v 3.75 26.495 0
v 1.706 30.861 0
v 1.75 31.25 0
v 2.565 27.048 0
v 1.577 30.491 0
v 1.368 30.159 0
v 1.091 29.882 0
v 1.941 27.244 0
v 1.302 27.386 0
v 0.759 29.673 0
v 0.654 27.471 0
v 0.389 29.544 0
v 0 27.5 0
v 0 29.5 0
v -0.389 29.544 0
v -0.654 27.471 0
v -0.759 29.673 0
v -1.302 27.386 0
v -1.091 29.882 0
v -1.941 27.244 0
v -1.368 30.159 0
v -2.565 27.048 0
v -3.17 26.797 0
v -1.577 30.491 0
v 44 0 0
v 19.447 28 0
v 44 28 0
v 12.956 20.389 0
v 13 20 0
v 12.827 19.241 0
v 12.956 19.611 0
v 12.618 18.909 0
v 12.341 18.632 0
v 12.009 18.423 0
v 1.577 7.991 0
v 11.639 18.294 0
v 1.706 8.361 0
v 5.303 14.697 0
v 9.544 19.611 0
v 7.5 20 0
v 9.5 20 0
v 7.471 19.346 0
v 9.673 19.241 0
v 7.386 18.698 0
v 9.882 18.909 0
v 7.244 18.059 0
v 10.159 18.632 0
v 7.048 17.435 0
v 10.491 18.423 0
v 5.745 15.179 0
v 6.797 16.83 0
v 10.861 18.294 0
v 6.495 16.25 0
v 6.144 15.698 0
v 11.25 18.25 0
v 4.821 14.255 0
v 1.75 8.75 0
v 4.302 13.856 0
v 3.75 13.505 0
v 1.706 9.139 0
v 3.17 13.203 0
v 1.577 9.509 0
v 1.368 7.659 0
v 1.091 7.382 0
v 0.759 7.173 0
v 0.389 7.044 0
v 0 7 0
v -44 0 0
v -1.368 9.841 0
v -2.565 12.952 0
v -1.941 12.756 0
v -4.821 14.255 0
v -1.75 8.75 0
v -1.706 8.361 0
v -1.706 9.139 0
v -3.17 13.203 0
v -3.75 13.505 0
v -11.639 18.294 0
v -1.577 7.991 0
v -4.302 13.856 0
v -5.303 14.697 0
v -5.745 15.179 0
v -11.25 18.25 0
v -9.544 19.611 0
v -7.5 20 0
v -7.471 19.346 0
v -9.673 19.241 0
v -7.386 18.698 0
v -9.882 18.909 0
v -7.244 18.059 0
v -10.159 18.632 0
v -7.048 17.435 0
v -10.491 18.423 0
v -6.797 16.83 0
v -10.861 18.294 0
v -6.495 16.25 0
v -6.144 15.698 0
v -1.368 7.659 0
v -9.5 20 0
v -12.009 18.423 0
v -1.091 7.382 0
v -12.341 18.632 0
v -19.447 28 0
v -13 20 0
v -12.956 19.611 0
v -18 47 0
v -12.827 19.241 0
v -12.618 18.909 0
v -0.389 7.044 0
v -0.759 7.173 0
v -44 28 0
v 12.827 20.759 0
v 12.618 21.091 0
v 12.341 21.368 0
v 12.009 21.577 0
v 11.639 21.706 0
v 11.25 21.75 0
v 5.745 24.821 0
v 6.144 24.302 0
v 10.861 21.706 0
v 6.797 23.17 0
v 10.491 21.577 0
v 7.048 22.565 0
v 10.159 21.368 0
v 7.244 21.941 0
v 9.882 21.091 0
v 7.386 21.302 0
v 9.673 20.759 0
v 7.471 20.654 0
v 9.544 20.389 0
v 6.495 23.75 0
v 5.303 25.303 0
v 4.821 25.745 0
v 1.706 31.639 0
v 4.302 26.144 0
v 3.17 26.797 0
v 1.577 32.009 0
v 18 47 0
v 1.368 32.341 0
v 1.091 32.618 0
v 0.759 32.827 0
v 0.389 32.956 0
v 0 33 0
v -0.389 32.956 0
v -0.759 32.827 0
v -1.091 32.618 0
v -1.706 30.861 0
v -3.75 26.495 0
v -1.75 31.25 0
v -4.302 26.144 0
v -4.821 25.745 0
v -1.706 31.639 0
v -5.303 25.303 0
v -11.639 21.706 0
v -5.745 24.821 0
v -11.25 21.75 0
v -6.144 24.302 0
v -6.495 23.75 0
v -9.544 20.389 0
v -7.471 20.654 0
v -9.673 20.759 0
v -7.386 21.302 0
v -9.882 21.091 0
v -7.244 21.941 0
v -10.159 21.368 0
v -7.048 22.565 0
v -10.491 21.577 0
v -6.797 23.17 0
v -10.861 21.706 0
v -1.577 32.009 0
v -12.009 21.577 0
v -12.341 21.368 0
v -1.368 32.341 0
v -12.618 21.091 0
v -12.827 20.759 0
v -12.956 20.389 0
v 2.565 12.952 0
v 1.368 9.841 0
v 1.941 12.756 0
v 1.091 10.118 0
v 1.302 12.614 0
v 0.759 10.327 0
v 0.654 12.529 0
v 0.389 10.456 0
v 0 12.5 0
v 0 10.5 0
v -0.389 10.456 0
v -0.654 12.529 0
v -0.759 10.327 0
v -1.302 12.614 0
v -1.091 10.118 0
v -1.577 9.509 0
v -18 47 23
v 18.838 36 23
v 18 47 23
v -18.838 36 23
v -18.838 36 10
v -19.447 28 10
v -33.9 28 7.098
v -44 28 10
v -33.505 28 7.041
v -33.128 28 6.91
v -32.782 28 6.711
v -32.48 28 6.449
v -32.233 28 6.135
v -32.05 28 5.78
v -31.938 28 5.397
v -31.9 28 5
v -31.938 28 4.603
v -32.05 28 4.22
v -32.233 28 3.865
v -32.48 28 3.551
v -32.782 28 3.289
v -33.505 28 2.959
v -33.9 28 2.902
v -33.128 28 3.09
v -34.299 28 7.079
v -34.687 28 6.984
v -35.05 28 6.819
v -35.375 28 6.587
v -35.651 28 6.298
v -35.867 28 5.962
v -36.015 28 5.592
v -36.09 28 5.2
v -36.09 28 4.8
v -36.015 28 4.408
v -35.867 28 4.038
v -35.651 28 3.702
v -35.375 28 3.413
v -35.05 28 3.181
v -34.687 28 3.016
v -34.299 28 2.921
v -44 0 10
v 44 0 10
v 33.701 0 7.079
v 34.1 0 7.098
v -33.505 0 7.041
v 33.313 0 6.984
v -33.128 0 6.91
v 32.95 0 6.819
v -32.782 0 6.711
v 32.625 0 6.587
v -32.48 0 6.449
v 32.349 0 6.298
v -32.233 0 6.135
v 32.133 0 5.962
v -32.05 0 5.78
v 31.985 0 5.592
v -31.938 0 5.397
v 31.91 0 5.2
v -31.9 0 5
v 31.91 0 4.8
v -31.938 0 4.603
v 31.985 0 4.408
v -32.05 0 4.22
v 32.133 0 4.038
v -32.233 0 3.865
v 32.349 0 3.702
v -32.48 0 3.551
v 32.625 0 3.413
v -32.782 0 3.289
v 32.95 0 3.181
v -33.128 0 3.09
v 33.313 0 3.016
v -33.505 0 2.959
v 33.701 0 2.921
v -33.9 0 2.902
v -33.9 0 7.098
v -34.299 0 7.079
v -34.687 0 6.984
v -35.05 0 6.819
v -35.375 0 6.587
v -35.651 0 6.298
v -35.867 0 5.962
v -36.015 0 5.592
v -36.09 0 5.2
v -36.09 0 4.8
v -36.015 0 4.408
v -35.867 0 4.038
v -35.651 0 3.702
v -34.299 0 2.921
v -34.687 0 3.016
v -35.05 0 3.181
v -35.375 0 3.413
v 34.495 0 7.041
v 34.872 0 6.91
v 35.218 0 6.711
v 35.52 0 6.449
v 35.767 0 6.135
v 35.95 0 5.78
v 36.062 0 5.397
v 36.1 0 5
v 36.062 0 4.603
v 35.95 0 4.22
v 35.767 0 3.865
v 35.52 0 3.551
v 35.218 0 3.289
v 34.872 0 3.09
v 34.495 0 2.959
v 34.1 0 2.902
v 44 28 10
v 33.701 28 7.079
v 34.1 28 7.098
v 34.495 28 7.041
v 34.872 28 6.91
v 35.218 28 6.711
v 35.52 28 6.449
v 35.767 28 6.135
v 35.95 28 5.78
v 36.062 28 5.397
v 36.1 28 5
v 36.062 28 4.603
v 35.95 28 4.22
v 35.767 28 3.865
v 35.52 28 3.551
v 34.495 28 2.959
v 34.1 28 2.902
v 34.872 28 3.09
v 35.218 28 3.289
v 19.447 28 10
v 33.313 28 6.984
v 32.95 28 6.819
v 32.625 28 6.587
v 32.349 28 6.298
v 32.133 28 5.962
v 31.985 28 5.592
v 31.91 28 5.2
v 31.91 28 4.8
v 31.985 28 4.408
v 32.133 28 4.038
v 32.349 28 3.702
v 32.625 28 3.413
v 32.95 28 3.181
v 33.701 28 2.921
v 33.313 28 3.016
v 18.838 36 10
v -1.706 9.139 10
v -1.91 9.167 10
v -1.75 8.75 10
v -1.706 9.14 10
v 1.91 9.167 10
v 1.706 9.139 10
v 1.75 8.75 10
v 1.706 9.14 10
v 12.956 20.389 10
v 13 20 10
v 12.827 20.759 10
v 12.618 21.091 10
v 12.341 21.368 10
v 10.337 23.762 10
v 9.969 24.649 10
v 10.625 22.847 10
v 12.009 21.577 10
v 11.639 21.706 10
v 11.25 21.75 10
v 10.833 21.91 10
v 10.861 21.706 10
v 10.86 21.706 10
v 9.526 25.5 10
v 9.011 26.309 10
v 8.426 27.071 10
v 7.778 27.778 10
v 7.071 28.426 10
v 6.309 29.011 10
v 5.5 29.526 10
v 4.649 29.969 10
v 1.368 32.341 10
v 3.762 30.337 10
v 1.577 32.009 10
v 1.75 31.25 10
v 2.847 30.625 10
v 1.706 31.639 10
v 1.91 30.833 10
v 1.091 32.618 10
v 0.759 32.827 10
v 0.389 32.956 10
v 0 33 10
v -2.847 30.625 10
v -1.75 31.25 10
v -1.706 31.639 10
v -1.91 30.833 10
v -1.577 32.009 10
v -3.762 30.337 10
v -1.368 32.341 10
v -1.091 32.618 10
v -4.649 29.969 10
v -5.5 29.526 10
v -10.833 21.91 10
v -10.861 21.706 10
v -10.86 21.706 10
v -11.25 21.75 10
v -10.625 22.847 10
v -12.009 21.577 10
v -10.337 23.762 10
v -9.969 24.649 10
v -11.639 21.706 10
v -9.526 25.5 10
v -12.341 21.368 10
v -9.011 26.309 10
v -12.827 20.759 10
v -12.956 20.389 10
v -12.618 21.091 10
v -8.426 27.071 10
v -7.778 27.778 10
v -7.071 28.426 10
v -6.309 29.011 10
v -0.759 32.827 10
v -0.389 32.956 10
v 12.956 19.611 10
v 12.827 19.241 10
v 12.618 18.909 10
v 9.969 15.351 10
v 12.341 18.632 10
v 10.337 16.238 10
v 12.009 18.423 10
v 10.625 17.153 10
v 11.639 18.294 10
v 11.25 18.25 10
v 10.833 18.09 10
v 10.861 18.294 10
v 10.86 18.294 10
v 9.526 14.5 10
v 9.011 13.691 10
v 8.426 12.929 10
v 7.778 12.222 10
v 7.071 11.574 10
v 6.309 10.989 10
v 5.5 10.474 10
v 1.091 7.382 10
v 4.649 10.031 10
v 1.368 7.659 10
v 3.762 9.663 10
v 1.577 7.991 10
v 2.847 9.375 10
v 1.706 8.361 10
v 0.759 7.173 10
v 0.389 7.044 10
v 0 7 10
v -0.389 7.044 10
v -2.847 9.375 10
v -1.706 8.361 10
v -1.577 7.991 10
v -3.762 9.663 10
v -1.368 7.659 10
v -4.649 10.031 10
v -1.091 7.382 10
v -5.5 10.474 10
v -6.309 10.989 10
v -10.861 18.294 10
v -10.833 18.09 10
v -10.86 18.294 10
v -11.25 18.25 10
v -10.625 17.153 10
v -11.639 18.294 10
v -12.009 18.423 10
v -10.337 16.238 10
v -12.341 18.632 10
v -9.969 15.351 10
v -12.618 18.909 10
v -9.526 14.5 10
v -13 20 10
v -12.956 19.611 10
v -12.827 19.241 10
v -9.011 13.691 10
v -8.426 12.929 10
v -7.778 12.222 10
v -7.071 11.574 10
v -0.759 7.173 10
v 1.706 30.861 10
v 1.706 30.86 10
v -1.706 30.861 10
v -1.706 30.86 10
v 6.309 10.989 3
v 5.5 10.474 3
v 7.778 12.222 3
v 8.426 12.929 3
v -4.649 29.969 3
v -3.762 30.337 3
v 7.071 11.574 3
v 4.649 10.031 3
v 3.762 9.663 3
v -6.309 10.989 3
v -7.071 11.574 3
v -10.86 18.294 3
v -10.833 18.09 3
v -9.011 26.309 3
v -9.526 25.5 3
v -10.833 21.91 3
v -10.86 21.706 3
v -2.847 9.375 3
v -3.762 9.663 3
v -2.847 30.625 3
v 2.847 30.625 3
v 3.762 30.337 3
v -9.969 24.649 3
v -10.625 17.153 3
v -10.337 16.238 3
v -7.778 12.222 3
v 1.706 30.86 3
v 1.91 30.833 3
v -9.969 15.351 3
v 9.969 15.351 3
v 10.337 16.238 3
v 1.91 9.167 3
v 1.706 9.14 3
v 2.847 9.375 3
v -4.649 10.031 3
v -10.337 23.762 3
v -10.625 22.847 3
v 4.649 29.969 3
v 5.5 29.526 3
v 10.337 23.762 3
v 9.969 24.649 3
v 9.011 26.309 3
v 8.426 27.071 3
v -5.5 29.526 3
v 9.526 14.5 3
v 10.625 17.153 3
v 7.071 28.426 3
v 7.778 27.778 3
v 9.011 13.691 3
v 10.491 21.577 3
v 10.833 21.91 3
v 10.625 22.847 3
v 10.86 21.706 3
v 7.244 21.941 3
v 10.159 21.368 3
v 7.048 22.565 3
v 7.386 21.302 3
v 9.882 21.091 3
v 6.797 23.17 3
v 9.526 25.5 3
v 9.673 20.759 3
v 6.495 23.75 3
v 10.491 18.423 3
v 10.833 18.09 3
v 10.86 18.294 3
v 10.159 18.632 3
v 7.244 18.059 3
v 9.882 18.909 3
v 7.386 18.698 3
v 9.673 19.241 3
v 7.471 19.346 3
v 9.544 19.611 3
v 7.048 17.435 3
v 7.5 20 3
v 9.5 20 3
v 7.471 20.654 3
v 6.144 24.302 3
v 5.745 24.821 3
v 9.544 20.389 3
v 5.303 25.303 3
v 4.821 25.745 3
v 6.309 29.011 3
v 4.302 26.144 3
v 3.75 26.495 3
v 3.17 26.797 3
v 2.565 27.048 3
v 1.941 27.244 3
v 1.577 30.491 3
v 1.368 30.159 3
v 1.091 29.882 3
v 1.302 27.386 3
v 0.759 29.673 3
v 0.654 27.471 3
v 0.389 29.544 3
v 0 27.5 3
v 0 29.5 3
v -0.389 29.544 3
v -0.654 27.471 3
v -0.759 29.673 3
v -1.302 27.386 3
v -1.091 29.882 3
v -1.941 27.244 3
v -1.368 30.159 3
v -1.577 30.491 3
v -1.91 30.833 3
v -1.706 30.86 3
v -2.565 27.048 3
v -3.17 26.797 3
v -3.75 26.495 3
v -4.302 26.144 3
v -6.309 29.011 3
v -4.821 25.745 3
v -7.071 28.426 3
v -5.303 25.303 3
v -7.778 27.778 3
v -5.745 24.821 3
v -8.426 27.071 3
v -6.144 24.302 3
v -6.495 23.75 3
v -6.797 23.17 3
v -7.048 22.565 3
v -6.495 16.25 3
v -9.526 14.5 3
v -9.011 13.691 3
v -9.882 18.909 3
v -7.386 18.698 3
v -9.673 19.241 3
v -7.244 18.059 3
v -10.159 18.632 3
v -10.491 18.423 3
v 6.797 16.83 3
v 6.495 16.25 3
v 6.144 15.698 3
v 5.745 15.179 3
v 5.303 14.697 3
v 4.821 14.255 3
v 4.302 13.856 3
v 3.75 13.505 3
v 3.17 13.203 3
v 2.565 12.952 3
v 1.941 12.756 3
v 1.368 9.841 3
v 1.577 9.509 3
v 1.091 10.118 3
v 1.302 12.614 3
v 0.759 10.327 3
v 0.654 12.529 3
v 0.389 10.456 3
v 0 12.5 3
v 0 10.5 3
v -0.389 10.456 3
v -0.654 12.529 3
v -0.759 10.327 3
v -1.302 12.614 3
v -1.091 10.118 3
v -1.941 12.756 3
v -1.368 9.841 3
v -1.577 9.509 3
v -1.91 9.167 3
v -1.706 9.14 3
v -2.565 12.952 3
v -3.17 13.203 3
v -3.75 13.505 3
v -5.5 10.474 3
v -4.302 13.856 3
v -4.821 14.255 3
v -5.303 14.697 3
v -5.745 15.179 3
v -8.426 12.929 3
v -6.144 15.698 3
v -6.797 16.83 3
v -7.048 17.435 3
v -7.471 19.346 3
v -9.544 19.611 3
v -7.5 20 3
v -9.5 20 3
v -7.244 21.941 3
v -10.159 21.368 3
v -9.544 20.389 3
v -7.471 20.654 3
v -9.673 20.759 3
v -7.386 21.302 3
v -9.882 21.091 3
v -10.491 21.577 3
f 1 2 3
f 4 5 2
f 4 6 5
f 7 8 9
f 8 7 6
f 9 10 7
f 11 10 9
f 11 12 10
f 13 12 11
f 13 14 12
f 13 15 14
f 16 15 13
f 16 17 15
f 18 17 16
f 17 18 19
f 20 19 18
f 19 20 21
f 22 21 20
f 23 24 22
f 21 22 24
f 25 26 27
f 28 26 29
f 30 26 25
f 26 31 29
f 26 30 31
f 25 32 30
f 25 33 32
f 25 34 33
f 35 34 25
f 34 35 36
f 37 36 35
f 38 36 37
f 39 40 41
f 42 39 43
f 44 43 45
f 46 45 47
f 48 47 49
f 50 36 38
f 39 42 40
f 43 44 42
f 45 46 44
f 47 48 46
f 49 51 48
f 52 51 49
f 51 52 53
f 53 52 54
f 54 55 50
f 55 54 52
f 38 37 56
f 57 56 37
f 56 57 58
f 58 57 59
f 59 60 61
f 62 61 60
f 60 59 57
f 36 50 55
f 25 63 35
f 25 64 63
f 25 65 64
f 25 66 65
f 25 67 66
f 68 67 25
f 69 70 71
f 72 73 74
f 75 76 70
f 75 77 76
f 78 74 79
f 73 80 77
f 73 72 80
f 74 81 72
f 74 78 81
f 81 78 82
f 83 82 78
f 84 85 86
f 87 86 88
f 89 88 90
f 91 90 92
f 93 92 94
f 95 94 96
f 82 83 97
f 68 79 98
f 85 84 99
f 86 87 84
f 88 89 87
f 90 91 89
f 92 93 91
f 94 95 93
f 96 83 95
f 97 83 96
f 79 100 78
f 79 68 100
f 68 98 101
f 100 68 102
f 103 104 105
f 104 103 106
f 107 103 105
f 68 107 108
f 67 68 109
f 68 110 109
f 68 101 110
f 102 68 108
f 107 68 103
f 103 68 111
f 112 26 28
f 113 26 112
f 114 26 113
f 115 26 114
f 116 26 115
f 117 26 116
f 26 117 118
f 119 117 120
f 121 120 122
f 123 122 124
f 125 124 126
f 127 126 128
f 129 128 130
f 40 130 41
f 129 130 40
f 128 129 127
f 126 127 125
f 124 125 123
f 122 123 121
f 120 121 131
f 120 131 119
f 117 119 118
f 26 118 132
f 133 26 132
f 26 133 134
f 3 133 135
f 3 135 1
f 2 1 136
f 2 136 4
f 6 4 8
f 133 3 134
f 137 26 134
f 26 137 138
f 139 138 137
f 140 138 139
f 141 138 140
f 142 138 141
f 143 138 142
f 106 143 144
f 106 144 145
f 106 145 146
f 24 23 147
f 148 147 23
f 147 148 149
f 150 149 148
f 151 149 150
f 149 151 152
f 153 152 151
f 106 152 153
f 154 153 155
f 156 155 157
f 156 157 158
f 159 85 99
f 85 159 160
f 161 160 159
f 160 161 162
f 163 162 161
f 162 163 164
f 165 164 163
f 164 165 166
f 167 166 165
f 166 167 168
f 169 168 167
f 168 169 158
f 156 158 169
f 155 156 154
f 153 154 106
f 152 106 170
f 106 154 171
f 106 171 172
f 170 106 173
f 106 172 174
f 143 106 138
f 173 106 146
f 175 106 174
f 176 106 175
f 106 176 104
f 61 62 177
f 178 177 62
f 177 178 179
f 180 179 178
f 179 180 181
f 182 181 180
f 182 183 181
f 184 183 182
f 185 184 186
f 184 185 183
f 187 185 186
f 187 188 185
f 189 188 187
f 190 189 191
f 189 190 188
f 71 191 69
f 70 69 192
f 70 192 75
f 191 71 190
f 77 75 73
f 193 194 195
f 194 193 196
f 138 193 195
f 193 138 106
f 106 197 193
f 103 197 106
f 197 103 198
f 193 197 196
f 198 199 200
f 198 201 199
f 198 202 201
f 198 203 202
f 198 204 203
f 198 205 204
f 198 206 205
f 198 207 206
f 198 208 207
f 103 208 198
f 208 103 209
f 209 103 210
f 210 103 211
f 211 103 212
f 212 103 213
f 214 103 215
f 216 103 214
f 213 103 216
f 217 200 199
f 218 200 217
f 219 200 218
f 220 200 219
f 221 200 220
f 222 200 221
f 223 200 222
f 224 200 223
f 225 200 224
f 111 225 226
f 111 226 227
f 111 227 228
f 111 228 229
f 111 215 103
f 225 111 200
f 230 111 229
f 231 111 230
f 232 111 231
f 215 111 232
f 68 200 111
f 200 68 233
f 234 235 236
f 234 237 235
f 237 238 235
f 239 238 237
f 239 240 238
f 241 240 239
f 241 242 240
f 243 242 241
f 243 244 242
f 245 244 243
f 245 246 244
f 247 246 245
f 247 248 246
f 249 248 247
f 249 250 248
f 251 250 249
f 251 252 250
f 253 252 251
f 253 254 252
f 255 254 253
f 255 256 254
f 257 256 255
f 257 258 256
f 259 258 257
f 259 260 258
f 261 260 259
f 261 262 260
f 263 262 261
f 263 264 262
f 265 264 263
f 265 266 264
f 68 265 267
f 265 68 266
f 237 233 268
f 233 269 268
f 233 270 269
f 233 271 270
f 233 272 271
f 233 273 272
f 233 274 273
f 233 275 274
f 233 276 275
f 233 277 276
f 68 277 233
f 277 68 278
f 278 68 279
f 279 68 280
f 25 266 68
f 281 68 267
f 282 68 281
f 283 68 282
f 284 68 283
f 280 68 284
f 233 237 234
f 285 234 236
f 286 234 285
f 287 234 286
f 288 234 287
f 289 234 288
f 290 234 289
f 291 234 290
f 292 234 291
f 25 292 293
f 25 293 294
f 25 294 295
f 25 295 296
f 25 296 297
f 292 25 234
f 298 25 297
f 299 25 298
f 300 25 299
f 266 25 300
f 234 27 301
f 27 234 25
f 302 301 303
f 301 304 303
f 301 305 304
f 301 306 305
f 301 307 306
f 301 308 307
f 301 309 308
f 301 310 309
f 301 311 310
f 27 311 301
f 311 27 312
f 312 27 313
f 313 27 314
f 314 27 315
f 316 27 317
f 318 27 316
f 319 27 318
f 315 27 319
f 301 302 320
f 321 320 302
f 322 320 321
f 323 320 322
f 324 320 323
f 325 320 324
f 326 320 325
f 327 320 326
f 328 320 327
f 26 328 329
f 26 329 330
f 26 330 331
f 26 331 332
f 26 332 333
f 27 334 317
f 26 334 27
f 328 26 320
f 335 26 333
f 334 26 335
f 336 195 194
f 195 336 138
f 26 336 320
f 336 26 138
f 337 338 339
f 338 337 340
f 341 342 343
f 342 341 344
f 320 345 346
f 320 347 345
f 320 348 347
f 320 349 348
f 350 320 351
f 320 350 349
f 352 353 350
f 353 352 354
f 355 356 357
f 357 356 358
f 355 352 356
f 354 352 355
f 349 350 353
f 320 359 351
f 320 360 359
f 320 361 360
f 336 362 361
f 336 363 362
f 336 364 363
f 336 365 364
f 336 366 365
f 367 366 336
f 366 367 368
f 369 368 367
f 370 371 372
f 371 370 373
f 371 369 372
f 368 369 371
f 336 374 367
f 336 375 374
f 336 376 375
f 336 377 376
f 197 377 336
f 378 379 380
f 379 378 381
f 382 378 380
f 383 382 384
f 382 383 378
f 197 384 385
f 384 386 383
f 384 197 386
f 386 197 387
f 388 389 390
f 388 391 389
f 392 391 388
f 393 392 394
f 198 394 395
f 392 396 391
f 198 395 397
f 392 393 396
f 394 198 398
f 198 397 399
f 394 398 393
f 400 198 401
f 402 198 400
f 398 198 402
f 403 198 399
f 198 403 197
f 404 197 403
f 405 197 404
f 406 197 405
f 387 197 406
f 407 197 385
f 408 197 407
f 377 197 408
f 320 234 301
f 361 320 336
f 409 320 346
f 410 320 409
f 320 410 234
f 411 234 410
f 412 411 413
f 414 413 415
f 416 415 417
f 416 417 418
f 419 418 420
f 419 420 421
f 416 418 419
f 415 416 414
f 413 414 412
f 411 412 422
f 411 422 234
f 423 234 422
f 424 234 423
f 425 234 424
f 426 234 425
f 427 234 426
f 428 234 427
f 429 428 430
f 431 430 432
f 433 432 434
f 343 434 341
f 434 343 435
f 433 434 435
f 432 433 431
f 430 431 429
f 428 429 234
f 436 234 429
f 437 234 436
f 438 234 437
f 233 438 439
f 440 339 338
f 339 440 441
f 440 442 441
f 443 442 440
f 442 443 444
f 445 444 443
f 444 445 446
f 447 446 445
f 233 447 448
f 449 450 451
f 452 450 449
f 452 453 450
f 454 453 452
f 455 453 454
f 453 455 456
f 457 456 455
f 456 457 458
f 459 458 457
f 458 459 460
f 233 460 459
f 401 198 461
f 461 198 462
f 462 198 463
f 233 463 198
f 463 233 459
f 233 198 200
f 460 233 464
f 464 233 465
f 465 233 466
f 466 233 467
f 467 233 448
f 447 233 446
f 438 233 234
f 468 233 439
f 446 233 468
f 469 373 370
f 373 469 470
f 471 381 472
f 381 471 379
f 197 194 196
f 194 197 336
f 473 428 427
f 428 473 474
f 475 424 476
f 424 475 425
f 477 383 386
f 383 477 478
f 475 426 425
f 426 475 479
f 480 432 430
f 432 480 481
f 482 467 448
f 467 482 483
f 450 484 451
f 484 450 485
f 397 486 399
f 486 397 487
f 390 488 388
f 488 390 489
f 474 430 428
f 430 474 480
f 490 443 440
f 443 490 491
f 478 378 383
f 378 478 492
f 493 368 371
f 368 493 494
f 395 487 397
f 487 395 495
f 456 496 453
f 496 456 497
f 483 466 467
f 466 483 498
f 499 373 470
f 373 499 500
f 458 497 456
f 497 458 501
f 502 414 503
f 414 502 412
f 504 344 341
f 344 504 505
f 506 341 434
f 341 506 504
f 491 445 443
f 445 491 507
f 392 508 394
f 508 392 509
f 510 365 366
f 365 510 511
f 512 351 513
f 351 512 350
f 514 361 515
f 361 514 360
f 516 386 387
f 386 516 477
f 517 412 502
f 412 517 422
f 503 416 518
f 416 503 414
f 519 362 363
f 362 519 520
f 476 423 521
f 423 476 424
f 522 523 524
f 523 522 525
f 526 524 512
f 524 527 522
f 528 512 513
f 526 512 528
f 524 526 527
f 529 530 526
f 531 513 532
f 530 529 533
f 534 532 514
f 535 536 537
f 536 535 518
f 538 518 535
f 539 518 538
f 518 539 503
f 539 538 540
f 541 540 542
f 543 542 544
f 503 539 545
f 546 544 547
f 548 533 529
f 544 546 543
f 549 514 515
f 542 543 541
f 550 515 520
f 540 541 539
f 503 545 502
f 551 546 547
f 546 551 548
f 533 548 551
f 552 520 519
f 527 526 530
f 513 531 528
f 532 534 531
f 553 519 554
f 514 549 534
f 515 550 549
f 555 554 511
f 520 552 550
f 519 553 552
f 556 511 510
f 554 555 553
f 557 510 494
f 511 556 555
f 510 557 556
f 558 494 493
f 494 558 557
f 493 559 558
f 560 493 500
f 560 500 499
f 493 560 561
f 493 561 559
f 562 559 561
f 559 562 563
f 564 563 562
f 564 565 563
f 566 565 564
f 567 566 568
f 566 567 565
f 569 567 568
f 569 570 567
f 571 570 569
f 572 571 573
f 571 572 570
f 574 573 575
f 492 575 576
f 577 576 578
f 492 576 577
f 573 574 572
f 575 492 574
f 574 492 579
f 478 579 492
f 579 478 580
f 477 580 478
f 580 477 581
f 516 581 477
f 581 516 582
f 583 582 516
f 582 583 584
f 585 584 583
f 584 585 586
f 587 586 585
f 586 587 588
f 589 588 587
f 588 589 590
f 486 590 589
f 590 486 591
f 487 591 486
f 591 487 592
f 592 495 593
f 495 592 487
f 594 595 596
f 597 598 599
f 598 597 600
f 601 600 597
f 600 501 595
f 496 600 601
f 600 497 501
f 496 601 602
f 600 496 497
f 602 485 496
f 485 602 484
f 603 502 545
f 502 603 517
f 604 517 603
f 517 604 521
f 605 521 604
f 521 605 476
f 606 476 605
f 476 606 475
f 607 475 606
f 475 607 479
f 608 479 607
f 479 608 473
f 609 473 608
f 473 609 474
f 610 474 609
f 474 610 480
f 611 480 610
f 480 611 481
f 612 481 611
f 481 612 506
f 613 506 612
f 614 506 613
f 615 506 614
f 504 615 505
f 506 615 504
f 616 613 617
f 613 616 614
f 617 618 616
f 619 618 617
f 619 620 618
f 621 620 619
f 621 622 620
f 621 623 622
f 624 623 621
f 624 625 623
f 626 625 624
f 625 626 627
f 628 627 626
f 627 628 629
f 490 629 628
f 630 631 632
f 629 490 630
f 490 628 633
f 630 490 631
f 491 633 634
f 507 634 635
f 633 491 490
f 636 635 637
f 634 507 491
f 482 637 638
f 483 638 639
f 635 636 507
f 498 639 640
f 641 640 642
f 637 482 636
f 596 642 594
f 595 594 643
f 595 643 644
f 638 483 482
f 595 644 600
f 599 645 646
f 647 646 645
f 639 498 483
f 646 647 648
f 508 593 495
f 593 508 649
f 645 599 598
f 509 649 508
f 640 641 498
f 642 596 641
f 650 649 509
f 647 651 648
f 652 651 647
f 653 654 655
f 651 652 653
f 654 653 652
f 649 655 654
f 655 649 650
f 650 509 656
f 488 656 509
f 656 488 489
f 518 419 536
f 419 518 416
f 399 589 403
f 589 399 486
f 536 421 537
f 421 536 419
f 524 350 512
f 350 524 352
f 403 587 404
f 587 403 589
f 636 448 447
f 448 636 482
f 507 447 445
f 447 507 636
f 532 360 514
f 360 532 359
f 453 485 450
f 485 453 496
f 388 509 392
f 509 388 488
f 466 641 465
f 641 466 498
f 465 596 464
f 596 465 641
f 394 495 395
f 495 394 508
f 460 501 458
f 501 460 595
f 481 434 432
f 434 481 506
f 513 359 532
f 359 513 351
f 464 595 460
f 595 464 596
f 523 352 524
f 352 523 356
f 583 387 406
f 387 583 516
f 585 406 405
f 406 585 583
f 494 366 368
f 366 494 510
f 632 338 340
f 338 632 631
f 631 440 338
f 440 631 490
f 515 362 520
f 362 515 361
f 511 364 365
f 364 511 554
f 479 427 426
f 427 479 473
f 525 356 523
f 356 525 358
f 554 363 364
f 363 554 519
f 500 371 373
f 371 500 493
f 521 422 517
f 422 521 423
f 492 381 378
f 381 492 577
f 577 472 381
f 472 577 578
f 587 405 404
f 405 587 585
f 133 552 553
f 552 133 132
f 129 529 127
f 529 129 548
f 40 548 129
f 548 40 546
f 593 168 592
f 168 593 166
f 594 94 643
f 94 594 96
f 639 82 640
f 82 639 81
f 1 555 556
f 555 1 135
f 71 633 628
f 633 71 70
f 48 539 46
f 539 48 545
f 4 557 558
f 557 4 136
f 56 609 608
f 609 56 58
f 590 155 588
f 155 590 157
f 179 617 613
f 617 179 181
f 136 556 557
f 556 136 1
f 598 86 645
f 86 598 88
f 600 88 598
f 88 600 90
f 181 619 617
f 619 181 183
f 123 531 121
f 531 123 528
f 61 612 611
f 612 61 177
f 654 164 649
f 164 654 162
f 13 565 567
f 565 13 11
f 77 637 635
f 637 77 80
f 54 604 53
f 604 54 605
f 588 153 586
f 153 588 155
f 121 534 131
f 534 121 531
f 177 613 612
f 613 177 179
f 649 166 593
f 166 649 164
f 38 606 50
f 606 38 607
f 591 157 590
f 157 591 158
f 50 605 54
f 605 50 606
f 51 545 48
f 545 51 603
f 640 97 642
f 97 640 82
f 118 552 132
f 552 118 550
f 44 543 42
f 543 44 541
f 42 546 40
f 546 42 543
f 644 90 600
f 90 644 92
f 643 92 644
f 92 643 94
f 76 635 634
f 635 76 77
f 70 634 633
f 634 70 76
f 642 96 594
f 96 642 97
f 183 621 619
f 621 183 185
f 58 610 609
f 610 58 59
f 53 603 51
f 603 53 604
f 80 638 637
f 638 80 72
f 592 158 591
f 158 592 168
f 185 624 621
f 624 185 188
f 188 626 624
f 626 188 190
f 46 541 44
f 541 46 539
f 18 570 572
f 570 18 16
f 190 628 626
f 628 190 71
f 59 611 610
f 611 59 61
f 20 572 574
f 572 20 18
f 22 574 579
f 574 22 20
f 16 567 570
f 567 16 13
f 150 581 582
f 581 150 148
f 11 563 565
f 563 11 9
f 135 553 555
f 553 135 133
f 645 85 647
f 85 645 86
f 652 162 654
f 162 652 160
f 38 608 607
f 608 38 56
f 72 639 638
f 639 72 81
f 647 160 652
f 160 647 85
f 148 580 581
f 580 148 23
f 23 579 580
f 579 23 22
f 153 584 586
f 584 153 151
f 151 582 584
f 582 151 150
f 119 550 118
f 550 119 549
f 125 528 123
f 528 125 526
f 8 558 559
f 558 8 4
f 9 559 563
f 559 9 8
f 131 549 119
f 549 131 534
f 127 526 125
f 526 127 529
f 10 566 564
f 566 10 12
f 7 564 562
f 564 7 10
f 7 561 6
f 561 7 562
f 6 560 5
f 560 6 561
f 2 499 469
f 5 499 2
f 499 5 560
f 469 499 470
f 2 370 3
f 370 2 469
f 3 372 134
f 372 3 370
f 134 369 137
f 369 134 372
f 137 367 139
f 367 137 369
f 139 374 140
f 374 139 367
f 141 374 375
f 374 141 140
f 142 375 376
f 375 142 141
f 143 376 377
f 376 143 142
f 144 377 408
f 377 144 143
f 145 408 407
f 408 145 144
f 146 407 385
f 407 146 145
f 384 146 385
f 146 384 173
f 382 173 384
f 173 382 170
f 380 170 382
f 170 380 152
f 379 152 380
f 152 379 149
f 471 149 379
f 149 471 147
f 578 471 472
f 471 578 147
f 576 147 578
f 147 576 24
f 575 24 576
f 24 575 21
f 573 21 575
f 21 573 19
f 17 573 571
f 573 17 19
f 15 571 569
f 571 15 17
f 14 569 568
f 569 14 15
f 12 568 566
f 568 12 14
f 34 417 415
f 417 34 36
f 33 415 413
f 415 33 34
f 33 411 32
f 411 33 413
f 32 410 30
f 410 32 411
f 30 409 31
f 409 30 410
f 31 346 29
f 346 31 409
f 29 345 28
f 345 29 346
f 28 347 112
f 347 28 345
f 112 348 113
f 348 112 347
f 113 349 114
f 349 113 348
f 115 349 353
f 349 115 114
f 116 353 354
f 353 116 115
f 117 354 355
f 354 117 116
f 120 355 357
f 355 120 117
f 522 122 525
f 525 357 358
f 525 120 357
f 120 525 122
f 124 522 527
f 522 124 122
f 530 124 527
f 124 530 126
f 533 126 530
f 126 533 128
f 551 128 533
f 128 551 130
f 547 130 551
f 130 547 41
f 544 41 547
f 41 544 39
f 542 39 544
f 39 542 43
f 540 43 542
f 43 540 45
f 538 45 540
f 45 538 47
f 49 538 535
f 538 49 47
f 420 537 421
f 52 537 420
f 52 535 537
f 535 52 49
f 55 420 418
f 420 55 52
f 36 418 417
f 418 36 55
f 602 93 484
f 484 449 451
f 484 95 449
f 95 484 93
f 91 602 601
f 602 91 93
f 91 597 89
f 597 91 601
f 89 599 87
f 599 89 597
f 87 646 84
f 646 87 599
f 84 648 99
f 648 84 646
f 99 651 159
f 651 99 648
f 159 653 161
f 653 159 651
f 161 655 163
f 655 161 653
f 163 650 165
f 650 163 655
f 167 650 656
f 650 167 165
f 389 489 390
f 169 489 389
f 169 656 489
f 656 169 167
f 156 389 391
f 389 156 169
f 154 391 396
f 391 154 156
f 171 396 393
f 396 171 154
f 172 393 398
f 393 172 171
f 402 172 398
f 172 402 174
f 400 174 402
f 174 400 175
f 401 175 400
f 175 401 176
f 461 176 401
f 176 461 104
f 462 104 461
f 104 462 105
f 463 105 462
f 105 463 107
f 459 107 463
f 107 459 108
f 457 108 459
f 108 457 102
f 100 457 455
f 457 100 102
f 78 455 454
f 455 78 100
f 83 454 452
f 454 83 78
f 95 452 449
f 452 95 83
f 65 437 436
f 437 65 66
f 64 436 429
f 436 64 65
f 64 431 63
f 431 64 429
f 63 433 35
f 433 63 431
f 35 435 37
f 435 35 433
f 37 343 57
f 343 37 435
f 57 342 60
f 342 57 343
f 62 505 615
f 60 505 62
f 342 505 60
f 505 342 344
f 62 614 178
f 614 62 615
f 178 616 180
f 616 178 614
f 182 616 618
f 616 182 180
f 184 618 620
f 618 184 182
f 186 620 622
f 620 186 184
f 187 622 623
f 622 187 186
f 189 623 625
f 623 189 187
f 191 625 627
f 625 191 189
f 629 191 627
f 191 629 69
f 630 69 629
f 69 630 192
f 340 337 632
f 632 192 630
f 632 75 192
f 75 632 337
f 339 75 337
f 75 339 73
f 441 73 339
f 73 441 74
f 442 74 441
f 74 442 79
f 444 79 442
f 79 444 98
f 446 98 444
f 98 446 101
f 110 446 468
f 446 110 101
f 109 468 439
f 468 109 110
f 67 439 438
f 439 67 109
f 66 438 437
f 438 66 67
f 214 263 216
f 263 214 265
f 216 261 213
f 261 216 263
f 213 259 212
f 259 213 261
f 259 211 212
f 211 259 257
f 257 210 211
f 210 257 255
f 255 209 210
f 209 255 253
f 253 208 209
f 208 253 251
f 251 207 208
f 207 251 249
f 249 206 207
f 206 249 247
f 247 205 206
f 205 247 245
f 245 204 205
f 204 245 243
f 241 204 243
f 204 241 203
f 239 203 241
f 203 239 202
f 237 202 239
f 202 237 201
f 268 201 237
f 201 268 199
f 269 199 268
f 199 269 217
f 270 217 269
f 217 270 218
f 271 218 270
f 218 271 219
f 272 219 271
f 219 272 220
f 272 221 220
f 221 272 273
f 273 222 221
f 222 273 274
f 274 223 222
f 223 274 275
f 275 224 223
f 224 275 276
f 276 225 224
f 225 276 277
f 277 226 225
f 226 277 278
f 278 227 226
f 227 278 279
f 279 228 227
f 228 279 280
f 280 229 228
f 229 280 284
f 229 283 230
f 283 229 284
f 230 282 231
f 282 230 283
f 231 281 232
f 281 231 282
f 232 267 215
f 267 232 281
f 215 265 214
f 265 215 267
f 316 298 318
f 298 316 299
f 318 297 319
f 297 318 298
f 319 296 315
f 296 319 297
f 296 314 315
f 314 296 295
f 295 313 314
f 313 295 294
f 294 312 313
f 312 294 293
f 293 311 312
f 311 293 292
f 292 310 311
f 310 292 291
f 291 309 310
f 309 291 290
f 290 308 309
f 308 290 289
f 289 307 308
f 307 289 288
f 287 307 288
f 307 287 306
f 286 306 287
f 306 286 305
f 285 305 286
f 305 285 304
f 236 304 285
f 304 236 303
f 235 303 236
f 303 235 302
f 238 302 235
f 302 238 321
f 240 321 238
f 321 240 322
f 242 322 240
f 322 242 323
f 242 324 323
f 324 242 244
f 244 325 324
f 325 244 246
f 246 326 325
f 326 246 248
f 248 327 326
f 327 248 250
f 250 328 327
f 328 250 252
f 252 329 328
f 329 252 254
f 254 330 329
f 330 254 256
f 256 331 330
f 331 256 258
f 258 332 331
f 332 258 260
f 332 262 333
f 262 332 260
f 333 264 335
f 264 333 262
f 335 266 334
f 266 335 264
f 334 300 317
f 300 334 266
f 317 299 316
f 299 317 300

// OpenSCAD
//$fn=60;
$fa=5;
$fs=.4;


difference(){
    body_all();
    bearing_hole();
    bearing_removal_holes();
    mounting_holes();
}

module body_all(){
    h1=28;
    h2=28;
    h3=47;
    h4=36;
    difference(){
        linear_extrude(height=23){
            translate([0,h1/2,0]) square([88,h1],center=true);
            translate([0,h2/2,0]) square([40,h2],center=true);
            hull(){
                translate([0,h3/2,0]) square([36,h3],center=true);
                translate([0,20,0]) circle(d=40);
            }
        }
        translate([0,0,10]) linear_extrude(height=20){
            translate([0,(h4-1)/2,0]) square([90,h4+1],center=true);
        }
    }
}

module bearing_hole(){
    translate([0,20,3]) linear_extrude(height=8) circle(d=22);
    translate([0,20,-1]) linear_extrude(height=8) circle(d=15);
}

module bearing_removal_holes(){
    removal_hole_diameter = 3.5;
    linear_extrude(height=12){
        translate([0,8.75,-1]) circle(d=removal_hole_diameter);
        translate([0,31.25,-1]) circle(d=removal_hole_diameter);
        translate([11.25,20,-1]) circle(d=removal_hole_diameter);
        translate([-11.25,20,-1]) circle(d=removal_hole_diameter);
    }
}

module mounting_holes(){
    translate([0,50,5]) rotate([90,0,0]) linear_extrude(height=100){
        translate([-34,0,0]) circle(d=4.2);
        translate([34,0,0]) circle(d=4.2);
    }
}
